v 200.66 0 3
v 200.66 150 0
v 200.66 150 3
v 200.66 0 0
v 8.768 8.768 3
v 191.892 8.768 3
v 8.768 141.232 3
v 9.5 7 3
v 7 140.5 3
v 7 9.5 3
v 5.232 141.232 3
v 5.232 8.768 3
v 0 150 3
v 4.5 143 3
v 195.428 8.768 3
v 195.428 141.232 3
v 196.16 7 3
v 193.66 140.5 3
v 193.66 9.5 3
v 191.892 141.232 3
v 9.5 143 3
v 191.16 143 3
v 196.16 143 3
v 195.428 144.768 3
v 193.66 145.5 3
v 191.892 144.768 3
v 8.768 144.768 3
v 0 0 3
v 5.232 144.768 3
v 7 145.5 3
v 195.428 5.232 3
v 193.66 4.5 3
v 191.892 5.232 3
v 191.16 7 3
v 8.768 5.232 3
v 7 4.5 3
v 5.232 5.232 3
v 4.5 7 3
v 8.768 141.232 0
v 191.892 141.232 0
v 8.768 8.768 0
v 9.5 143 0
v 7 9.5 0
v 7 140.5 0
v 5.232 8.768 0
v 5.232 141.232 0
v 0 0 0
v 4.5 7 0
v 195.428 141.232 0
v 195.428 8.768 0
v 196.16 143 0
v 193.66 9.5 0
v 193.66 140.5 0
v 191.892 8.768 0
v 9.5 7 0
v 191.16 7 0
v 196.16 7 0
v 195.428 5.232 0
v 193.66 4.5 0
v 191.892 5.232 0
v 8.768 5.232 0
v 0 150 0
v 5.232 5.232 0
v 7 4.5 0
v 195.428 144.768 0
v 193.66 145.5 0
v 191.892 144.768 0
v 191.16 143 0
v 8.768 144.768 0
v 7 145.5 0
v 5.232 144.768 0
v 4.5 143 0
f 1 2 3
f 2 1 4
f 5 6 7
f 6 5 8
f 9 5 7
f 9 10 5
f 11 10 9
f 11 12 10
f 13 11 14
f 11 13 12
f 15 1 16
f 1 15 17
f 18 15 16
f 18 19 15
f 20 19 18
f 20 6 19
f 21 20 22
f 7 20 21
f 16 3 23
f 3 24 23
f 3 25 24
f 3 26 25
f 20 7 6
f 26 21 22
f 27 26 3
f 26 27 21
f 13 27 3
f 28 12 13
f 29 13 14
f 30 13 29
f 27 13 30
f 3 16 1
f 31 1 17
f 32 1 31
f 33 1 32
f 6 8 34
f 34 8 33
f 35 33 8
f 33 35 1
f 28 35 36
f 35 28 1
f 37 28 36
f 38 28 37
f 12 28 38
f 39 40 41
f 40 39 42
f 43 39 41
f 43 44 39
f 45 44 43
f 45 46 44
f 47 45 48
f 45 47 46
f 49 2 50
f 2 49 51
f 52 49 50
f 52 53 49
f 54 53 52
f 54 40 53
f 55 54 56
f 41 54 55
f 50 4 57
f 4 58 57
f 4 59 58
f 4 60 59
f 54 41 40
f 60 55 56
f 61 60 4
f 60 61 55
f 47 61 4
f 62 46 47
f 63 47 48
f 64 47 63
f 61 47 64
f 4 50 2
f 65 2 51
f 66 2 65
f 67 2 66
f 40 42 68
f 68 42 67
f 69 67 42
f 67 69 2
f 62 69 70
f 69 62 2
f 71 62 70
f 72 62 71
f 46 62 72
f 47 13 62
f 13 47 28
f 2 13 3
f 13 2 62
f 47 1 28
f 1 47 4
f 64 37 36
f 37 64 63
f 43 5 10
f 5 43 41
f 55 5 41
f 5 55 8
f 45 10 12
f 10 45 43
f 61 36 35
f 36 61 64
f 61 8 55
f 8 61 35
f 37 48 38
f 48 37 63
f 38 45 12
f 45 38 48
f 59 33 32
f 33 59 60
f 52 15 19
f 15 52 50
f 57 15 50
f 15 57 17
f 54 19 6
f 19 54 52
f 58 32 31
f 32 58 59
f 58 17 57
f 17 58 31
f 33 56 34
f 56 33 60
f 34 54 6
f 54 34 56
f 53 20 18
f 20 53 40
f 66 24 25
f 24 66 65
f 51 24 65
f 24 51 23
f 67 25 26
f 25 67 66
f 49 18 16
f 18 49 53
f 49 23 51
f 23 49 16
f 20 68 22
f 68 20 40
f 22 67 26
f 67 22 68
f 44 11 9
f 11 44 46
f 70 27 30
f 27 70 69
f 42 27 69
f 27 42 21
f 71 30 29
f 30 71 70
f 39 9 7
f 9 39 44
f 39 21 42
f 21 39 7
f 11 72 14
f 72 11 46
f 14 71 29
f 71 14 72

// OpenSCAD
/*
Carbonite control panels filler panel

1" = 25.4mm

*/

LENGTH_IN  = 7.9;
BASE_LENGTH = LENGTH_IN * 25.4; //300;
BASE_WIDTH = 150;
BASE_HEIGHT = 50;

WALL_THICKNESS = 3;

color("grey")
difference(){
    
    // panel base and frames
    cube([BASE_LENGTH,BASE_WIDTH,WALL_THICKNESS]);
    
    // mounting holes
    mounting_bolt_shaft_diameter = 5;
    translate([7,7,-1]){
        cylinder(r=mounting_bolt_shaft_diameter/2,h=WALL_THICKNESS*3);
    }
    translate([BASE_LENGTH-7,7,-1]){
        cylinder(r=mounting_bolt_shaft_diameter/2,h=WALL_THICKNESS*3);
    }
    translate([BASE_LENGTH-7,BASE_WIDTH-7,-1]){
        cylinder(r=mounting_bolt_shaft_diameter/2,h=WALL_THICKNESS*3);
    }
    translate([7,BASE_WIDTH-7,-1]){
        cylinder(r=mounting_bolt_shaft_diameter/2,h=WALL_THICKNESS*3);
    }
}
